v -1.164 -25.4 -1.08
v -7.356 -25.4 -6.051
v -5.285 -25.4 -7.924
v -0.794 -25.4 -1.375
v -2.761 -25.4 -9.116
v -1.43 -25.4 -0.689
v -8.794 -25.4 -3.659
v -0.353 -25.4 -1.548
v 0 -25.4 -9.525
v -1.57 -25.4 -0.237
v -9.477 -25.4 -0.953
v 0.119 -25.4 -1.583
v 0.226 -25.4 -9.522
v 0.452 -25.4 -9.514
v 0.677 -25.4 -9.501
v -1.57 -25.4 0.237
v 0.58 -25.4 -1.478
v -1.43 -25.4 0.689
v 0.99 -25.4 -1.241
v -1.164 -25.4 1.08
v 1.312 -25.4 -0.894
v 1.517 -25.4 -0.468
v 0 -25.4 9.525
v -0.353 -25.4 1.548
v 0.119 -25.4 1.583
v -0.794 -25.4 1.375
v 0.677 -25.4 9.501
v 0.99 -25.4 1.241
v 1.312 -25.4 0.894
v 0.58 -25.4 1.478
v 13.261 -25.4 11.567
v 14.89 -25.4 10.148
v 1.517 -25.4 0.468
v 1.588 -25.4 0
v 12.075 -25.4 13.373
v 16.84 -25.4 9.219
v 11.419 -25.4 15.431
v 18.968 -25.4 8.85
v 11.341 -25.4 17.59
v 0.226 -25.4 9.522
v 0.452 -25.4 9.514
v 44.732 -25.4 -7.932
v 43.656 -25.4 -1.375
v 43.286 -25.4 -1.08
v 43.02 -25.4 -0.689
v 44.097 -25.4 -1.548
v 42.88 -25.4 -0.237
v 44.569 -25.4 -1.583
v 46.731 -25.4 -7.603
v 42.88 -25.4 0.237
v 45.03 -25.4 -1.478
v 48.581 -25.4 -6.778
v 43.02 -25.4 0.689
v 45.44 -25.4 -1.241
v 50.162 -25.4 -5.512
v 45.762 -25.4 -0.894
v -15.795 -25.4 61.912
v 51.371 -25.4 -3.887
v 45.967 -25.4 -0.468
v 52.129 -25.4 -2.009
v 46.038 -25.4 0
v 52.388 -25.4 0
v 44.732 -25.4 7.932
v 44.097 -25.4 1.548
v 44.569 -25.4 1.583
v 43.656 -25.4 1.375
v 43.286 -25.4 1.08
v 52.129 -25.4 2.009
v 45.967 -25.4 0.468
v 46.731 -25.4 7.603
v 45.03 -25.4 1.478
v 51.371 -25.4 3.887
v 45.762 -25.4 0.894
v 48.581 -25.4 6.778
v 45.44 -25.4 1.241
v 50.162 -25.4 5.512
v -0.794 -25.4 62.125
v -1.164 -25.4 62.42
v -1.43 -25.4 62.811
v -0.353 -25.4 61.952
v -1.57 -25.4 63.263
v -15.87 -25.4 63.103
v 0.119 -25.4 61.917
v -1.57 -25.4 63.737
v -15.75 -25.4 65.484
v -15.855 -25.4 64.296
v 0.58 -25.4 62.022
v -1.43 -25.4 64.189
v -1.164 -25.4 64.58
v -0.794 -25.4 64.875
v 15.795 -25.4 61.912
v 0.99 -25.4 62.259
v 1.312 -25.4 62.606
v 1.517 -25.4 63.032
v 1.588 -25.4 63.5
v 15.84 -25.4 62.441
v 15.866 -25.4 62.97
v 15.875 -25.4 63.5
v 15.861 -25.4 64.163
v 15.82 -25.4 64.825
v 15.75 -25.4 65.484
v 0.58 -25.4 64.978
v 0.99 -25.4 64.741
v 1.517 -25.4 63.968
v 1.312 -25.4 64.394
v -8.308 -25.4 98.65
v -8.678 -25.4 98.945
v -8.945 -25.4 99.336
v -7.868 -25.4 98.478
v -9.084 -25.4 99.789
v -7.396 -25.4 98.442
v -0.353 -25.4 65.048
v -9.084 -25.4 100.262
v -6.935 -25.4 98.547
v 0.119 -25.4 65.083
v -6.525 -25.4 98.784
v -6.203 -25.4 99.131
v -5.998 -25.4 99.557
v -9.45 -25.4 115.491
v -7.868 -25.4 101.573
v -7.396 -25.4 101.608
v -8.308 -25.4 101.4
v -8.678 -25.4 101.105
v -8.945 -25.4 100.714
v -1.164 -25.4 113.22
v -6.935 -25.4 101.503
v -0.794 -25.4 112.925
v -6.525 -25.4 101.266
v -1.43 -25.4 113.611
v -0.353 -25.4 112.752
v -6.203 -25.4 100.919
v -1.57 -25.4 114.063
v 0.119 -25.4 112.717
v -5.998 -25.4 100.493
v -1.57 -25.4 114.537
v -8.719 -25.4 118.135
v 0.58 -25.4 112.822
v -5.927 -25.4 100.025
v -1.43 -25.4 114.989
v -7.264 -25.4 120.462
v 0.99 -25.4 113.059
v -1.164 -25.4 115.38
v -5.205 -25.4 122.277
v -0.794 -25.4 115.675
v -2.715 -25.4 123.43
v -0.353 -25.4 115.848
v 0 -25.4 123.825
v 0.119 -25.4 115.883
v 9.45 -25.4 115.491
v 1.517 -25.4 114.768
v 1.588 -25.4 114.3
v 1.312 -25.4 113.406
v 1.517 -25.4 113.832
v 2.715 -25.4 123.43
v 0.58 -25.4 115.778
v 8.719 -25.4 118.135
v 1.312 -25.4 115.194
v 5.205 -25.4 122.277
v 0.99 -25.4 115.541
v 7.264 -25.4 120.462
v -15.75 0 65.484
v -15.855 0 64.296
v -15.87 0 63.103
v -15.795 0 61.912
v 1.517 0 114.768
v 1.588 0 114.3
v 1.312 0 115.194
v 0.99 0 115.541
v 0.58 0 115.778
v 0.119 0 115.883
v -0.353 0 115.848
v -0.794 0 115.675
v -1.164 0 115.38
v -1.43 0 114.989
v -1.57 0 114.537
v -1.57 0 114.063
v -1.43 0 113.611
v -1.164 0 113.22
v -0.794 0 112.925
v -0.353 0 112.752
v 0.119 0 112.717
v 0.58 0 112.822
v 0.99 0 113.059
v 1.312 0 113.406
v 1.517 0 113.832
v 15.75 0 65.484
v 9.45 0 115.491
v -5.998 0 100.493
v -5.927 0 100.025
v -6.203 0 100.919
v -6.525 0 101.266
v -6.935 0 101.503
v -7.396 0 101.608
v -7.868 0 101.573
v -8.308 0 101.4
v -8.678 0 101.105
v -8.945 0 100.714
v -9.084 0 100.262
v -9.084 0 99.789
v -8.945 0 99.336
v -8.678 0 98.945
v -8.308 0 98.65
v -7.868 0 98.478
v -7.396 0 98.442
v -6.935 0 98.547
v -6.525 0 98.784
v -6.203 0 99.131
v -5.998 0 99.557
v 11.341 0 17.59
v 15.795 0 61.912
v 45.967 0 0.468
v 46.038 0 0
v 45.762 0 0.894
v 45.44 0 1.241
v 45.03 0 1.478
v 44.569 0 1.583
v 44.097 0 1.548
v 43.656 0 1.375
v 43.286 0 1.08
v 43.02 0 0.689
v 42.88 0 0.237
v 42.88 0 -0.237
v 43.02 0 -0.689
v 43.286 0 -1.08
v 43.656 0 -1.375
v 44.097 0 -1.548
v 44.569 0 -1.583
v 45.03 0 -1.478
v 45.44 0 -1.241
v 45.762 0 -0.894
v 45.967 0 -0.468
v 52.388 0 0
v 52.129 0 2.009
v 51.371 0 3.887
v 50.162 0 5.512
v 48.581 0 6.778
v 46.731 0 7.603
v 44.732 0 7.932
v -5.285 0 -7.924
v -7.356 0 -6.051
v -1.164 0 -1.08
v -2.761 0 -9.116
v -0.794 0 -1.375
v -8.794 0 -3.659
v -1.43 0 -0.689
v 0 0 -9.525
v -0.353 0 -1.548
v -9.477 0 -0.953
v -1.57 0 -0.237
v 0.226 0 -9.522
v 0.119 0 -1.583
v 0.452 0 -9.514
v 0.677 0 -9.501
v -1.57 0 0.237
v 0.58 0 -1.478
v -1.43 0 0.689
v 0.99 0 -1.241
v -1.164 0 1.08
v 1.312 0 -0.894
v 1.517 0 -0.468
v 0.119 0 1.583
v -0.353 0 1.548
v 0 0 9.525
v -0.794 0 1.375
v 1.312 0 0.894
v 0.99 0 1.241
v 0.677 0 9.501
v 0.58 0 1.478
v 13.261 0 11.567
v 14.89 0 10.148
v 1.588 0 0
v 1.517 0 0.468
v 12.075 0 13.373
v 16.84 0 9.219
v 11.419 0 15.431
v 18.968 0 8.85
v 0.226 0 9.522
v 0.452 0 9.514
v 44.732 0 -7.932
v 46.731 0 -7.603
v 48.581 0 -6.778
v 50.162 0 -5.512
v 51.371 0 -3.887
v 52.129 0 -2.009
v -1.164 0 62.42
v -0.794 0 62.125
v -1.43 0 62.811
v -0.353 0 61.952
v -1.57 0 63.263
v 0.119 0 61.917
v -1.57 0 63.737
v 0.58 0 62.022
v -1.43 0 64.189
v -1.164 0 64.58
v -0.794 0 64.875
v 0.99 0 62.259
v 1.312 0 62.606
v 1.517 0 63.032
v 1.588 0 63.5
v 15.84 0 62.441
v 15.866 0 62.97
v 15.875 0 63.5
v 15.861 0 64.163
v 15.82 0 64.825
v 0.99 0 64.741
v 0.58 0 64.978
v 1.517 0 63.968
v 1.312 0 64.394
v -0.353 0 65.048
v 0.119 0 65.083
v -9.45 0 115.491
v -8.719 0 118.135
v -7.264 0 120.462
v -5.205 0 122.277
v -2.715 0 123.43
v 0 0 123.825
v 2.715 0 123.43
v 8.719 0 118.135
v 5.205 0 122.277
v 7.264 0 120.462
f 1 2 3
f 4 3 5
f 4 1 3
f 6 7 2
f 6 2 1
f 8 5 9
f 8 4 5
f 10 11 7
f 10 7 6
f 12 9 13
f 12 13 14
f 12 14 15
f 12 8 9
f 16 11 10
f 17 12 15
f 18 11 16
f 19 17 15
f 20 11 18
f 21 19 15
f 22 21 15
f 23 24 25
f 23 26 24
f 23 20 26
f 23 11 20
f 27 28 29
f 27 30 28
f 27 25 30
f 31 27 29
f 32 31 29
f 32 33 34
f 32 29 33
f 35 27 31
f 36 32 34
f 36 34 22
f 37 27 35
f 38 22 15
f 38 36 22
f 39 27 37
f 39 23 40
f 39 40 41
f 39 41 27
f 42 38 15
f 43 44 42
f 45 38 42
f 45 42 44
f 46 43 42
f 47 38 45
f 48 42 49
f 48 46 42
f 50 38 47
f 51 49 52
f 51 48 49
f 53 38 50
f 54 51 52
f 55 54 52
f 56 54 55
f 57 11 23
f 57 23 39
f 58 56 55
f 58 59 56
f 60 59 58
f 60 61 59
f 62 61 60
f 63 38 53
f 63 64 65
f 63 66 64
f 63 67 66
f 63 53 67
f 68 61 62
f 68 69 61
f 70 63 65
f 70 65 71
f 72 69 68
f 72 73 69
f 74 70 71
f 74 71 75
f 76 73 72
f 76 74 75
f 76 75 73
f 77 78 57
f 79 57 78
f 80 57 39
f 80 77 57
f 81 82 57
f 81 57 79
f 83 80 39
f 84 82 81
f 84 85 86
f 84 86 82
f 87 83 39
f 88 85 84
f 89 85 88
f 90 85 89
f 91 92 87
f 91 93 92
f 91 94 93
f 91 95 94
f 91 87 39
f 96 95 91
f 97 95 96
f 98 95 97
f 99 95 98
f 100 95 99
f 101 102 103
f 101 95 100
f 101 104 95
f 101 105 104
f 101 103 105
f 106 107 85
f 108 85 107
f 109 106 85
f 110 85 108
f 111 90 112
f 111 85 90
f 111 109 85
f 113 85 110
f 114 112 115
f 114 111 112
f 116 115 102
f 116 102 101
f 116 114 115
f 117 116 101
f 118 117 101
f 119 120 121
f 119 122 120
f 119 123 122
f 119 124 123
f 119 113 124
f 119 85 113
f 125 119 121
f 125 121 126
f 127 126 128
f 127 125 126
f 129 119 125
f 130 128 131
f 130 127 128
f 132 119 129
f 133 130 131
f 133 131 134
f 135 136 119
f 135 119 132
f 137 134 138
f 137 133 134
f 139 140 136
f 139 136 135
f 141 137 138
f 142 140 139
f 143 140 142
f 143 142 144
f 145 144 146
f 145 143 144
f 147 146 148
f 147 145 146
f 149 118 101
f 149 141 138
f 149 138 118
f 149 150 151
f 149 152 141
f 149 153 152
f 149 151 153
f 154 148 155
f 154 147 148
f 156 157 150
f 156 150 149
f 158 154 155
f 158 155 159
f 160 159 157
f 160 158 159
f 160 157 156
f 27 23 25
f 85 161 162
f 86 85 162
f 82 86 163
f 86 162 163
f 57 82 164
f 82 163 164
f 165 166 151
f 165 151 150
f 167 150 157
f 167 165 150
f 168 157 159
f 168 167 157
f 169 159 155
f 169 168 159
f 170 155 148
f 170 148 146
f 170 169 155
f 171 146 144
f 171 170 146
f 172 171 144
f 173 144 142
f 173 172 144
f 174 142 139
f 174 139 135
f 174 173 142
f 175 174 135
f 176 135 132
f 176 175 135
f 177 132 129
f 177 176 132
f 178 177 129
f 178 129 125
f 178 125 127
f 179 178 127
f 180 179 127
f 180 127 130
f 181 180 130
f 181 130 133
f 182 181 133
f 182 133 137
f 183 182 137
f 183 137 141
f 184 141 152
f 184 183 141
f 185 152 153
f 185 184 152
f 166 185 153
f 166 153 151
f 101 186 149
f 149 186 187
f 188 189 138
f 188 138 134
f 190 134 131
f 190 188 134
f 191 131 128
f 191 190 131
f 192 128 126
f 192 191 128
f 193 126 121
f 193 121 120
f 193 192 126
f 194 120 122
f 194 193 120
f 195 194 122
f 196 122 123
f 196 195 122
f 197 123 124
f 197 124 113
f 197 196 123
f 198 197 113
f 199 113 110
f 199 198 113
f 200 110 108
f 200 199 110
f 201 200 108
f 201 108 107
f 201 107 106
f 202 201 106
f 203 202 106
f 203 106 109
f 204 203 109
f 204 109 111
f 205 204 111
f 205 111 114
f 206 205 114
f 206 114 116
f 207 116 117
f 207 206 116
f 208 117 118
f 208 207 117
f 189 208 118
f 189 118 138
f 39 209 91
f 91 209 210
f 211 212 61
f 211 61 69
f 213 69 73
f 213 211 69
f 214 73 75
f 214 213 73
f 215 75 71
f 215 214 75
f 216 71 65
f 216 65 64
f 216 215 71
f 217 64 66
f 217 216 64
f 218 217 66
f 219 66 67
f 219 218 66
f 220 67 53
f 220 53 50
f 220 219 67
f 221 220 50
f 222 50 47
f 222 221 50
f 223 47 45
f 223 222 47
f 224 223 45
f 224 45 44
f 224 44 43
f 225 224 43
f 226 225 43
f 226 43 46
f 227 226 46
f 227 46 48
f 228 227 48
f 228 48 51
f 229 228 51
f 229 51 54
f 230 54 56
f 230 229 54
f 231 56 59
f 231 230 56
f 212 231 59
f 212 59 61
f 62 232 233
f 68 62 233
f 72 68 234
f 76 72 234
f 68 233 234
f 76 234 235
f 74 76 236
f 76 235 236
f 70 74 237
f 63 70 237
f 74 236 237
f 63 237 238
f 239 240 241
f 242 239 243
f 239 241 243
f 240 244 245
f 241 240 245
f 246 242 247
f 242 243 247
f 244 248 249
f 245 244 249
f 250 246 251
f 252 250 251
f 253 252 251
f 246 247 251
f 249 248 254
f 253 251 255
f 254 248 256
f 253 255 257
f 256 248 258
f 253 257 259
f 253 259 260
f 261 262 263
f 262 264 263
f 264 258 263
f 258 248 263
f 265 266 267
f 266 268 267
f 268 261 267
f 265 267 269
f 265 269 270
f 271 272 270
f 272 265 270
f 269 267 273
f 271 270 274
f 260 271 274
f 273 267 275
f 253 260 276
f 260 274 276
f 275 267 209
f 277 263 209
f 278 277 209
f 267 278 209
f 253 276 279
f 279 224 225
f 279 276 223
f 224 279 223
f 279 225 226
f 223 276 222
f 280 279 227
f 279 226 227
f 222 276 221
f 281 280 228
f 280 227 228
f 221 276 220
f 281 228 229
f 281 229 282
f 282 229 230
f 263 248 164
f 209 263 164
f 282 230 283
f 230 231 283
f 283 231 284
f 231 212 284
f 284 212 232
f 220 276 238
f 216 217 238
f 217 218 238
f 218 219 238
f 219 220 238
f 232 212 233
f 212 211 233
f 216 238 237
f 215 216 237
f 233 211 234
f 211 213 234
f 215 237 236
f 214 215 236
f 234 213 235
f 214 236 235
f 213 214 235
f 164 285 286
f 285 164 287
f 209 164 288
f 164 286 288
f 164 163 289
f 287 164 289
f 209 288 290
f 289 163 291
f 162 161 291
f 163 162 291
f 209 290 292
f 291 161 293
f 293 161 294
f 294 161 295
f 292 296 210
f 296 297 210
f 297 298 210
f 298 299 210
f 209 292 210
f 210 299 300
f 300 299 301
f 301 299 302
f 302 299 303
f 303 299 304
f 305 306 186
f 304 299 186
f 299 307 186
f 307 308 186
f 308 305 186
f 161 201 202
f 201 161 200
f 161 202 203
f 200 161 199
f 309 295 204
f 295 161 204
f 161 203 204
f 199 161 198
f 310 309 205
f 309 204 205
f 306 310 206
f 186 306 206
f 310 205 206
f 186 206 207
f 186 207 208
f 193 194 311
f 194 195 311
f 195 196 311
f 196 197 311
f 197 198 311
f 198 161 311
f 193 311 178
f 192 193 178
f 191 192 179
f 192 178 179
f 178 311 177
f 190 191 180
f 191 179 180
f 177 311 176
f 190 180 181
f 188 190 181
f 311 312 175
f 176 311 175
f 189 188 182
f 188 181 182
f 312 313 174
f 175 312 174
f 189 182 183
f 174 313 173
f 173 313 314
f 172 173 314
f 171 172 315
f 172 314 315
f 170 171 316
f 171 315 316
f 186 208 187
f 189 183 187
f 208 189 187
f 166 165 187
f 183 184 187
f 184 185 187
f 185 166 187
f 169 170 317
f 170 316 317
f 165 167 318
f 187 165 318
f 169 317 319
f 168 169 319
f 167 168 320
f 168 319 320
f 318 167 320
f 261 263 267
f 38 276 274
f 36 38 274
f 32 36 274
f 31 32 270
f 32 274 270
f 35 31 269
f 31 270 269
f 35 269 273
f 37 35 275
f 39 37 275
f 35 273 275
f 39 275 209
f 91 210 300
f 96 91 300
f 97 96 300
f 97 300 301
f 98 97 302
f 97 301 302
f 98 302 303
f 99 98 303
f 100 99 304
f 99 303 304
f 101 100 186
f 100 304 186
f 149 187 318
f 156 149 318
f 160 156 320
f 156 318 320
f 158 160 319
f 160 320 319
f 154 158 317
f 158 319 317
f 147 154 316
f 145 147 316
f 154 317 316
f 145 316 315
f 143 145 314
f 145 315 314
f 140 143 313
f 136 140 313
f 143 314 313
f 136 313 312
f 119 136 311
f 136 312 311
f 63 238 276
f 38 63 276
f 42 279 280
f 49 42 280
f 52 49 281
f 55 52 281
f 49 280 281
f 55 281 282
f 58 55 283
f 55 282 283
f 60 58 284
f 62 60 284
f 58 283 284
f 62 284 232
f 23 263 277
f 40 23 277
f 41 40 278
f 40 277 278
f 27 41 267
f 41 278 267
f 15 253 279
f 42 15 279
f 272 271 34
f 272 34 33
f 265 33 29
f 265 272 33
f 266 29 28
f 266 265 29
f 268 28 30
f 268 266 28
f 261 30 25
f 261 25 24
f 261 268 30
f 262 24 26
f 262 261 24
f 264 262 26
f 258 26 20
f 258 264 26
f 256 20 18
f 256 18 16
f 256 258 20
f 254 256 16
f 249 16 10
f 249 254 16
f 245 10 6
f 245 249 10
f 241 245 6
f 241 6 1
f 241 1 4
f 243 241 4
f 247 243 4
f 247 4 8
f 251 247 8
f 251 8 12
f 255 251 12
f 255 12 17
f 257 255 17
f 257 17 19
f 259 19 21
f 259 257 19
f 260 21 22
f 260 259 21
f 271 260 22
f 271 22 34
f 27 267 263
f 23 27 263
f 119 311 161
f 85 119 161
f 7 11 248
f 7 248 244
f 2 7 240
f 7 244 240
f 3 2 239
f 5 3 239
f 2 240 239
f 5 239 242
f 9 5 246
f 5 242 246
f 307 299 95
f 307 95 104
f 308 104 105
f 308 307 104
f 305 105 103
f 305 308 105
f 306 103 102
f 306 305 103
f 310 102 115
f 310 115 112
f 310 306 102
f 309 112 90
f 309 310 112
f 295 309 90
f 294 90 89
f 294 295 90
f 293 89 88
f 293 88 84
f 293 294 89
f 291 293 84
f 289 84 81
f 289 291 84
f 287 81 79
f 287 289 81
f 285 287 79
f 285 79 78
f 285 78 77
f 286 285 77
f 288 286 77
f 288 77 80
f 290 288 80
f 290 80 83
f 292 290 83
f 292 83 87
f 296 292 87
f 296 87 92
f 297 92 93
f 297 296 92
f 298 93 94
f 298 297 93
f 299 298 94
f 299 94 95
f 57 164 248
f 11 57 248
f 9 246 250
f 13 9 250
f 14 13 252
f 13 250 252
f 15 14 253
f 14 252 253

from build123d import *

# Parameters (mm, degrees)
F0_R     = 1.5875
F1_DEPTH = 25.4


with BuildPart() as f1:
    # F0 (on Front) → F1 (new body)
    with BuildSketch(Plane.XZ):
        with BuildLine():
            ThreePointArc((-9.450293, 115.490625), (-0.596483, 104.793695), (9.525, 114.3))
            ThreePointArc((9.525, 114.3), (9.506305, 114.896483), (9.450293, 115.490625))
            ThreePointArc((9.450293, 115.490625), (0, 123.825), (-9.450293, 115.490625))
        make_face()
        with Locations((0, 114.3)):
            Circle(F0_R, mode=Mode.SUBTRACT)
        with BuildLine():
            ThreePointArc((9.450293, 115.490625), (9.506305, 114.896483), (9.525, 114.3))
            ThreePointArc((9.525, 114.3), (-0.596483, 104.793695), (-9.450293, 115.490625))
            Line((-9.450293, 115.490625), (-15.750488, 65.484375))
            ThreePointArc((-15.750488, 65.484375), (0, 79.375), (15.750488, 65.484375))
            Line((15.750488, 65.484375), (9.450293, 115.490625))
        make_face()
        with Locations((-7.514715, 100.0252)):
            Circle(F0_R, mode=Mode.SUBTRACT)
        with BuildLine():
            ThreePointArc((15.875, 63.5), (15.843841, 64.494139), (15.750488, 65.484375))
            ThreePointArc((15.750488, 65.484375), (0, 79.375), (-15.750488, 65.484375))
            ThreePointArc((-15.750488, 65.484375), (-15.873744, 63.699705), (-15.795426, 61.9125))
            ThreePointArc((-15.795426, 61.9125), (0, 47.625), (15.795426, 61.9125))
            ThreePointArc((15.795426, 61.9125), (15.855094, 62.705253), (15.875, 63.5))
        make_face()
        with Locations((0, 63.5)):
            Circle(F0_R, mode=Mode.SUBTRACT)
        with BuildLine():
            ThreePointArc((15.795426, 61.9125), (0, 47.625), (-15.795426, 61.9125))
            Line((-15.795426, 61.9125), (-9.477255, -0.9525))
            ThreePointArc((-9.477255, -0.9525), (-7.063929, 6.389564), (0, 9.525))
            ThreePointArc((0, 9.525), (0.338886, 9.51897), (0.677344, 9.500886))
            ThreePointArc((0.677344, 9.500886), (6.970557, 6.491299), (9.525, 0))
            ThreePointArc((9.525, 0), (9.513056, -0.476848), (9.477255, -0.9525))
            ThreePointArc((9.477255, -0.9525), (6.636844, -6.832125), (0.677344, -9.500886))
            Line((0.677344, -9.500886), (44.732405, -7.932475))
            ThreePointArc((44.732405, -7.932475), (36.5125, 0), (44.732405, 7.932475))
            Line((44.732405, 7.932475), (18.968328, 8.849706))
            ThreePointArc((18.968328, 8.849706), (13.261204, 11.567463), (11.340836, 17.589892))
            Line((11.340836, 17.589892), (15.795426, 61.9125))
        make_face()
        with BuildLine():
            ThreePointArc((0, 9.525), (-7.063929, 6.389564), (-9.477255, -0.9525))
            ThreePointArc((-9.477255, -0.9525), (-6.389564, -7.063929), (0, -9.525))
            Line((0, -9.525), (0.677344, -9.500886))
            ThreePointArc((0.677344, -9.500886), (6.636844, -6.832125), (9.477255, -0.9525))
            ThreePointArc((9.477255, -0.9525), (9.513056, -0.476848), (9.525, 0))
            ThreePointArc((9.525, 0), (6.970557, 6.491299), (0.677344, 9.500886))
            Line((0.677344, 9.500886), (0, 9.525))
        make_face()
        Circle(F0_R, mode=Mode.SUBTRACT)
        with BuildLine():
            Line((0.677344, -9.500886), (0, -9.525))
            ThreePointArc((0, -9.525), (0.338886, -9.51897), (0.677344, -9.500886))
        make_face()
        with BuildLine():
            ThreePointArc((52.3875, 0), (50.161633, 5.51191), (44.732405, 7.932475))
            ThreePointArc((44.732405, 7.932475), (36.5125, 0), (44.732405, -7.932475))
            ThreePointArc((44.732405, -7.932475), (50.161633, -5.51191), (52.3875, 0))
        make_face()
        with Locations((44.45, 0)):
            Circle(F0_R, mode=Mode.SUBTRACT)
    extrude(amount=F1_DEPTH)


solid = f1.part
